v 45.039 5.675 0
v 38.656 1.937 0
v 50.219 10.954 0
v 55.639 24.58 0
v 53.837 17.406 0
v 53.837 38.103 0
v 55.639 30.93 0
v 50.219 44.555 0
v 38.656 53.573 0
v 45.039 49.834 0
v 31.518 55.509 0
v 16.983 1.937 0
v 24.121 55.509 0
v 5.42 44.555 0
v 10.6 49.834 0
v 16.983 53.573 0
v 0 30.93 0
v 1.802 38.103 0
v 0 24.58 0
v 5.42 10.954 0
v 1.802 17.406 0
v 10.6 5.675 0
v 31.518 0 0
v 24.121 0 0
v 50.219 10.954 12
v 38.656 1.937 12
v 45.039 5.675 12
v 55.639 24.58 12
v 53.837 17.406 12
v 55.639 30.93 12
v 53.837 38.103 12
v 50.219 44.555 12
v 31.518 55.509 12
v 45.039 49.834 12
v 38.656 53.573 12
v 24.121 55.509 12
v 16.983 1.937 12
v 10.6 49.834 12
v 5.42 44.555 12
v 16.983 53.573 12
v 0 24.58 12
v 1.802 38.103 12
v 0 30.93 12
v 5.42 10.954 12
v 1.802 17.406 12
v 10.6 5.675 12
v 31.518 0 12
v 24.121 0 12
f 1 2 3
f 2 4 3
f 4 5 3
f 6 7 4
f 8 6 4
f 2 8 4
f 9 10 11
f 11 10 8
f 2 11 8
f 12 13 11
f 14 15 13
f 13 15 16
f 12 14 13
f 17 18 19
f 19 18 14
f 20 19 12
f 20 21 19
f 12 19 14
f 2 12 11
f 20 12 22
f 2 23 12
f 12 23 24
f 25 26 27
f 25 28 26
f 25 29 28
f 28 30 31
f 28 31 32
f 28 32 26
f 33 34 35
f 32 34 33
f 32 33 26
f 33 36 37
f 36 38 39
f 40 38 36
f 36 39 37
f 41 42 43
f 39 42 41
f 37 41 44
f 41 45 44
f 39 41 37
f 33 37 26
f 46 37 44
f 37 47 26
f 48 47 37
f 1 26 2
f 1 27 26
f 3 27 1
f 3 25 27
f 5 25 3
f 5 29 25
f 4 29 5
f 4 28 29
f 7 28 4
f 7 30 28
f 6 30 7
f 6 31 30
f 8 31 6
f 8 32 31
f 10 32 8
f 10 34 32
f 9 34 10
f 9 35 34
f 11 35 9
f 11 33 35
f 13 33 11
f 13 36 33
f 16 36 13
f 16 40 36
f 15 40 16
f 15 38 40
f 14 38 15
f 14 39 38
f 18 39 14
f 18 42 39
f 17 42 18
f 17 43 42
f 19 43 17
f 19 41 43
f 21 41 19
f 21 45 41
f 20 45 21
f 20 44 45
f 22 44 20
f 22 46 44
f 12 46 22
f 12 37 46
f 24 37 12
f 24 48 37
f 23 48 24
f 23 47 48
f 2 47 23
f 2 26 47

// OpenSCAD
$fn = 32;

// ----------------------------------------------------------------------
// Flat adaptor: double_d, 12 mm thick
// ----------------------------------------------------------------------

// --- parameters (mm) ---
profile_height = 12;      // extrusion height
profile_points = 24;      // points of the closed outline

profile = [[55.639, 30.93], [53.837, 38.103], [50.219, 44.555], [45.039, 49.834], [38.656, 53.573], [31.518, 55.509], [24.121, 55.509], [16.983, 53.573], [10.6, 49.834], [5.42, 44.555], [1.802, 38.103], [0, 30.93], [0, 24.58], [1.802, 17.406], [5.42, 10.954], [10.6, 5.675], [16.983, 1.937], [24.121, 0], [31.518, 0], [38.656, 1.937], [45.039, 5.675], [50.219, 10.954], [53.837, 17.406], [55.639, 24.58]];  // single closed polygon, 24 points, counter clockwise

// --- the one profile operation ---
linear_extrude(height = profile_height) polygon(points = profile);
